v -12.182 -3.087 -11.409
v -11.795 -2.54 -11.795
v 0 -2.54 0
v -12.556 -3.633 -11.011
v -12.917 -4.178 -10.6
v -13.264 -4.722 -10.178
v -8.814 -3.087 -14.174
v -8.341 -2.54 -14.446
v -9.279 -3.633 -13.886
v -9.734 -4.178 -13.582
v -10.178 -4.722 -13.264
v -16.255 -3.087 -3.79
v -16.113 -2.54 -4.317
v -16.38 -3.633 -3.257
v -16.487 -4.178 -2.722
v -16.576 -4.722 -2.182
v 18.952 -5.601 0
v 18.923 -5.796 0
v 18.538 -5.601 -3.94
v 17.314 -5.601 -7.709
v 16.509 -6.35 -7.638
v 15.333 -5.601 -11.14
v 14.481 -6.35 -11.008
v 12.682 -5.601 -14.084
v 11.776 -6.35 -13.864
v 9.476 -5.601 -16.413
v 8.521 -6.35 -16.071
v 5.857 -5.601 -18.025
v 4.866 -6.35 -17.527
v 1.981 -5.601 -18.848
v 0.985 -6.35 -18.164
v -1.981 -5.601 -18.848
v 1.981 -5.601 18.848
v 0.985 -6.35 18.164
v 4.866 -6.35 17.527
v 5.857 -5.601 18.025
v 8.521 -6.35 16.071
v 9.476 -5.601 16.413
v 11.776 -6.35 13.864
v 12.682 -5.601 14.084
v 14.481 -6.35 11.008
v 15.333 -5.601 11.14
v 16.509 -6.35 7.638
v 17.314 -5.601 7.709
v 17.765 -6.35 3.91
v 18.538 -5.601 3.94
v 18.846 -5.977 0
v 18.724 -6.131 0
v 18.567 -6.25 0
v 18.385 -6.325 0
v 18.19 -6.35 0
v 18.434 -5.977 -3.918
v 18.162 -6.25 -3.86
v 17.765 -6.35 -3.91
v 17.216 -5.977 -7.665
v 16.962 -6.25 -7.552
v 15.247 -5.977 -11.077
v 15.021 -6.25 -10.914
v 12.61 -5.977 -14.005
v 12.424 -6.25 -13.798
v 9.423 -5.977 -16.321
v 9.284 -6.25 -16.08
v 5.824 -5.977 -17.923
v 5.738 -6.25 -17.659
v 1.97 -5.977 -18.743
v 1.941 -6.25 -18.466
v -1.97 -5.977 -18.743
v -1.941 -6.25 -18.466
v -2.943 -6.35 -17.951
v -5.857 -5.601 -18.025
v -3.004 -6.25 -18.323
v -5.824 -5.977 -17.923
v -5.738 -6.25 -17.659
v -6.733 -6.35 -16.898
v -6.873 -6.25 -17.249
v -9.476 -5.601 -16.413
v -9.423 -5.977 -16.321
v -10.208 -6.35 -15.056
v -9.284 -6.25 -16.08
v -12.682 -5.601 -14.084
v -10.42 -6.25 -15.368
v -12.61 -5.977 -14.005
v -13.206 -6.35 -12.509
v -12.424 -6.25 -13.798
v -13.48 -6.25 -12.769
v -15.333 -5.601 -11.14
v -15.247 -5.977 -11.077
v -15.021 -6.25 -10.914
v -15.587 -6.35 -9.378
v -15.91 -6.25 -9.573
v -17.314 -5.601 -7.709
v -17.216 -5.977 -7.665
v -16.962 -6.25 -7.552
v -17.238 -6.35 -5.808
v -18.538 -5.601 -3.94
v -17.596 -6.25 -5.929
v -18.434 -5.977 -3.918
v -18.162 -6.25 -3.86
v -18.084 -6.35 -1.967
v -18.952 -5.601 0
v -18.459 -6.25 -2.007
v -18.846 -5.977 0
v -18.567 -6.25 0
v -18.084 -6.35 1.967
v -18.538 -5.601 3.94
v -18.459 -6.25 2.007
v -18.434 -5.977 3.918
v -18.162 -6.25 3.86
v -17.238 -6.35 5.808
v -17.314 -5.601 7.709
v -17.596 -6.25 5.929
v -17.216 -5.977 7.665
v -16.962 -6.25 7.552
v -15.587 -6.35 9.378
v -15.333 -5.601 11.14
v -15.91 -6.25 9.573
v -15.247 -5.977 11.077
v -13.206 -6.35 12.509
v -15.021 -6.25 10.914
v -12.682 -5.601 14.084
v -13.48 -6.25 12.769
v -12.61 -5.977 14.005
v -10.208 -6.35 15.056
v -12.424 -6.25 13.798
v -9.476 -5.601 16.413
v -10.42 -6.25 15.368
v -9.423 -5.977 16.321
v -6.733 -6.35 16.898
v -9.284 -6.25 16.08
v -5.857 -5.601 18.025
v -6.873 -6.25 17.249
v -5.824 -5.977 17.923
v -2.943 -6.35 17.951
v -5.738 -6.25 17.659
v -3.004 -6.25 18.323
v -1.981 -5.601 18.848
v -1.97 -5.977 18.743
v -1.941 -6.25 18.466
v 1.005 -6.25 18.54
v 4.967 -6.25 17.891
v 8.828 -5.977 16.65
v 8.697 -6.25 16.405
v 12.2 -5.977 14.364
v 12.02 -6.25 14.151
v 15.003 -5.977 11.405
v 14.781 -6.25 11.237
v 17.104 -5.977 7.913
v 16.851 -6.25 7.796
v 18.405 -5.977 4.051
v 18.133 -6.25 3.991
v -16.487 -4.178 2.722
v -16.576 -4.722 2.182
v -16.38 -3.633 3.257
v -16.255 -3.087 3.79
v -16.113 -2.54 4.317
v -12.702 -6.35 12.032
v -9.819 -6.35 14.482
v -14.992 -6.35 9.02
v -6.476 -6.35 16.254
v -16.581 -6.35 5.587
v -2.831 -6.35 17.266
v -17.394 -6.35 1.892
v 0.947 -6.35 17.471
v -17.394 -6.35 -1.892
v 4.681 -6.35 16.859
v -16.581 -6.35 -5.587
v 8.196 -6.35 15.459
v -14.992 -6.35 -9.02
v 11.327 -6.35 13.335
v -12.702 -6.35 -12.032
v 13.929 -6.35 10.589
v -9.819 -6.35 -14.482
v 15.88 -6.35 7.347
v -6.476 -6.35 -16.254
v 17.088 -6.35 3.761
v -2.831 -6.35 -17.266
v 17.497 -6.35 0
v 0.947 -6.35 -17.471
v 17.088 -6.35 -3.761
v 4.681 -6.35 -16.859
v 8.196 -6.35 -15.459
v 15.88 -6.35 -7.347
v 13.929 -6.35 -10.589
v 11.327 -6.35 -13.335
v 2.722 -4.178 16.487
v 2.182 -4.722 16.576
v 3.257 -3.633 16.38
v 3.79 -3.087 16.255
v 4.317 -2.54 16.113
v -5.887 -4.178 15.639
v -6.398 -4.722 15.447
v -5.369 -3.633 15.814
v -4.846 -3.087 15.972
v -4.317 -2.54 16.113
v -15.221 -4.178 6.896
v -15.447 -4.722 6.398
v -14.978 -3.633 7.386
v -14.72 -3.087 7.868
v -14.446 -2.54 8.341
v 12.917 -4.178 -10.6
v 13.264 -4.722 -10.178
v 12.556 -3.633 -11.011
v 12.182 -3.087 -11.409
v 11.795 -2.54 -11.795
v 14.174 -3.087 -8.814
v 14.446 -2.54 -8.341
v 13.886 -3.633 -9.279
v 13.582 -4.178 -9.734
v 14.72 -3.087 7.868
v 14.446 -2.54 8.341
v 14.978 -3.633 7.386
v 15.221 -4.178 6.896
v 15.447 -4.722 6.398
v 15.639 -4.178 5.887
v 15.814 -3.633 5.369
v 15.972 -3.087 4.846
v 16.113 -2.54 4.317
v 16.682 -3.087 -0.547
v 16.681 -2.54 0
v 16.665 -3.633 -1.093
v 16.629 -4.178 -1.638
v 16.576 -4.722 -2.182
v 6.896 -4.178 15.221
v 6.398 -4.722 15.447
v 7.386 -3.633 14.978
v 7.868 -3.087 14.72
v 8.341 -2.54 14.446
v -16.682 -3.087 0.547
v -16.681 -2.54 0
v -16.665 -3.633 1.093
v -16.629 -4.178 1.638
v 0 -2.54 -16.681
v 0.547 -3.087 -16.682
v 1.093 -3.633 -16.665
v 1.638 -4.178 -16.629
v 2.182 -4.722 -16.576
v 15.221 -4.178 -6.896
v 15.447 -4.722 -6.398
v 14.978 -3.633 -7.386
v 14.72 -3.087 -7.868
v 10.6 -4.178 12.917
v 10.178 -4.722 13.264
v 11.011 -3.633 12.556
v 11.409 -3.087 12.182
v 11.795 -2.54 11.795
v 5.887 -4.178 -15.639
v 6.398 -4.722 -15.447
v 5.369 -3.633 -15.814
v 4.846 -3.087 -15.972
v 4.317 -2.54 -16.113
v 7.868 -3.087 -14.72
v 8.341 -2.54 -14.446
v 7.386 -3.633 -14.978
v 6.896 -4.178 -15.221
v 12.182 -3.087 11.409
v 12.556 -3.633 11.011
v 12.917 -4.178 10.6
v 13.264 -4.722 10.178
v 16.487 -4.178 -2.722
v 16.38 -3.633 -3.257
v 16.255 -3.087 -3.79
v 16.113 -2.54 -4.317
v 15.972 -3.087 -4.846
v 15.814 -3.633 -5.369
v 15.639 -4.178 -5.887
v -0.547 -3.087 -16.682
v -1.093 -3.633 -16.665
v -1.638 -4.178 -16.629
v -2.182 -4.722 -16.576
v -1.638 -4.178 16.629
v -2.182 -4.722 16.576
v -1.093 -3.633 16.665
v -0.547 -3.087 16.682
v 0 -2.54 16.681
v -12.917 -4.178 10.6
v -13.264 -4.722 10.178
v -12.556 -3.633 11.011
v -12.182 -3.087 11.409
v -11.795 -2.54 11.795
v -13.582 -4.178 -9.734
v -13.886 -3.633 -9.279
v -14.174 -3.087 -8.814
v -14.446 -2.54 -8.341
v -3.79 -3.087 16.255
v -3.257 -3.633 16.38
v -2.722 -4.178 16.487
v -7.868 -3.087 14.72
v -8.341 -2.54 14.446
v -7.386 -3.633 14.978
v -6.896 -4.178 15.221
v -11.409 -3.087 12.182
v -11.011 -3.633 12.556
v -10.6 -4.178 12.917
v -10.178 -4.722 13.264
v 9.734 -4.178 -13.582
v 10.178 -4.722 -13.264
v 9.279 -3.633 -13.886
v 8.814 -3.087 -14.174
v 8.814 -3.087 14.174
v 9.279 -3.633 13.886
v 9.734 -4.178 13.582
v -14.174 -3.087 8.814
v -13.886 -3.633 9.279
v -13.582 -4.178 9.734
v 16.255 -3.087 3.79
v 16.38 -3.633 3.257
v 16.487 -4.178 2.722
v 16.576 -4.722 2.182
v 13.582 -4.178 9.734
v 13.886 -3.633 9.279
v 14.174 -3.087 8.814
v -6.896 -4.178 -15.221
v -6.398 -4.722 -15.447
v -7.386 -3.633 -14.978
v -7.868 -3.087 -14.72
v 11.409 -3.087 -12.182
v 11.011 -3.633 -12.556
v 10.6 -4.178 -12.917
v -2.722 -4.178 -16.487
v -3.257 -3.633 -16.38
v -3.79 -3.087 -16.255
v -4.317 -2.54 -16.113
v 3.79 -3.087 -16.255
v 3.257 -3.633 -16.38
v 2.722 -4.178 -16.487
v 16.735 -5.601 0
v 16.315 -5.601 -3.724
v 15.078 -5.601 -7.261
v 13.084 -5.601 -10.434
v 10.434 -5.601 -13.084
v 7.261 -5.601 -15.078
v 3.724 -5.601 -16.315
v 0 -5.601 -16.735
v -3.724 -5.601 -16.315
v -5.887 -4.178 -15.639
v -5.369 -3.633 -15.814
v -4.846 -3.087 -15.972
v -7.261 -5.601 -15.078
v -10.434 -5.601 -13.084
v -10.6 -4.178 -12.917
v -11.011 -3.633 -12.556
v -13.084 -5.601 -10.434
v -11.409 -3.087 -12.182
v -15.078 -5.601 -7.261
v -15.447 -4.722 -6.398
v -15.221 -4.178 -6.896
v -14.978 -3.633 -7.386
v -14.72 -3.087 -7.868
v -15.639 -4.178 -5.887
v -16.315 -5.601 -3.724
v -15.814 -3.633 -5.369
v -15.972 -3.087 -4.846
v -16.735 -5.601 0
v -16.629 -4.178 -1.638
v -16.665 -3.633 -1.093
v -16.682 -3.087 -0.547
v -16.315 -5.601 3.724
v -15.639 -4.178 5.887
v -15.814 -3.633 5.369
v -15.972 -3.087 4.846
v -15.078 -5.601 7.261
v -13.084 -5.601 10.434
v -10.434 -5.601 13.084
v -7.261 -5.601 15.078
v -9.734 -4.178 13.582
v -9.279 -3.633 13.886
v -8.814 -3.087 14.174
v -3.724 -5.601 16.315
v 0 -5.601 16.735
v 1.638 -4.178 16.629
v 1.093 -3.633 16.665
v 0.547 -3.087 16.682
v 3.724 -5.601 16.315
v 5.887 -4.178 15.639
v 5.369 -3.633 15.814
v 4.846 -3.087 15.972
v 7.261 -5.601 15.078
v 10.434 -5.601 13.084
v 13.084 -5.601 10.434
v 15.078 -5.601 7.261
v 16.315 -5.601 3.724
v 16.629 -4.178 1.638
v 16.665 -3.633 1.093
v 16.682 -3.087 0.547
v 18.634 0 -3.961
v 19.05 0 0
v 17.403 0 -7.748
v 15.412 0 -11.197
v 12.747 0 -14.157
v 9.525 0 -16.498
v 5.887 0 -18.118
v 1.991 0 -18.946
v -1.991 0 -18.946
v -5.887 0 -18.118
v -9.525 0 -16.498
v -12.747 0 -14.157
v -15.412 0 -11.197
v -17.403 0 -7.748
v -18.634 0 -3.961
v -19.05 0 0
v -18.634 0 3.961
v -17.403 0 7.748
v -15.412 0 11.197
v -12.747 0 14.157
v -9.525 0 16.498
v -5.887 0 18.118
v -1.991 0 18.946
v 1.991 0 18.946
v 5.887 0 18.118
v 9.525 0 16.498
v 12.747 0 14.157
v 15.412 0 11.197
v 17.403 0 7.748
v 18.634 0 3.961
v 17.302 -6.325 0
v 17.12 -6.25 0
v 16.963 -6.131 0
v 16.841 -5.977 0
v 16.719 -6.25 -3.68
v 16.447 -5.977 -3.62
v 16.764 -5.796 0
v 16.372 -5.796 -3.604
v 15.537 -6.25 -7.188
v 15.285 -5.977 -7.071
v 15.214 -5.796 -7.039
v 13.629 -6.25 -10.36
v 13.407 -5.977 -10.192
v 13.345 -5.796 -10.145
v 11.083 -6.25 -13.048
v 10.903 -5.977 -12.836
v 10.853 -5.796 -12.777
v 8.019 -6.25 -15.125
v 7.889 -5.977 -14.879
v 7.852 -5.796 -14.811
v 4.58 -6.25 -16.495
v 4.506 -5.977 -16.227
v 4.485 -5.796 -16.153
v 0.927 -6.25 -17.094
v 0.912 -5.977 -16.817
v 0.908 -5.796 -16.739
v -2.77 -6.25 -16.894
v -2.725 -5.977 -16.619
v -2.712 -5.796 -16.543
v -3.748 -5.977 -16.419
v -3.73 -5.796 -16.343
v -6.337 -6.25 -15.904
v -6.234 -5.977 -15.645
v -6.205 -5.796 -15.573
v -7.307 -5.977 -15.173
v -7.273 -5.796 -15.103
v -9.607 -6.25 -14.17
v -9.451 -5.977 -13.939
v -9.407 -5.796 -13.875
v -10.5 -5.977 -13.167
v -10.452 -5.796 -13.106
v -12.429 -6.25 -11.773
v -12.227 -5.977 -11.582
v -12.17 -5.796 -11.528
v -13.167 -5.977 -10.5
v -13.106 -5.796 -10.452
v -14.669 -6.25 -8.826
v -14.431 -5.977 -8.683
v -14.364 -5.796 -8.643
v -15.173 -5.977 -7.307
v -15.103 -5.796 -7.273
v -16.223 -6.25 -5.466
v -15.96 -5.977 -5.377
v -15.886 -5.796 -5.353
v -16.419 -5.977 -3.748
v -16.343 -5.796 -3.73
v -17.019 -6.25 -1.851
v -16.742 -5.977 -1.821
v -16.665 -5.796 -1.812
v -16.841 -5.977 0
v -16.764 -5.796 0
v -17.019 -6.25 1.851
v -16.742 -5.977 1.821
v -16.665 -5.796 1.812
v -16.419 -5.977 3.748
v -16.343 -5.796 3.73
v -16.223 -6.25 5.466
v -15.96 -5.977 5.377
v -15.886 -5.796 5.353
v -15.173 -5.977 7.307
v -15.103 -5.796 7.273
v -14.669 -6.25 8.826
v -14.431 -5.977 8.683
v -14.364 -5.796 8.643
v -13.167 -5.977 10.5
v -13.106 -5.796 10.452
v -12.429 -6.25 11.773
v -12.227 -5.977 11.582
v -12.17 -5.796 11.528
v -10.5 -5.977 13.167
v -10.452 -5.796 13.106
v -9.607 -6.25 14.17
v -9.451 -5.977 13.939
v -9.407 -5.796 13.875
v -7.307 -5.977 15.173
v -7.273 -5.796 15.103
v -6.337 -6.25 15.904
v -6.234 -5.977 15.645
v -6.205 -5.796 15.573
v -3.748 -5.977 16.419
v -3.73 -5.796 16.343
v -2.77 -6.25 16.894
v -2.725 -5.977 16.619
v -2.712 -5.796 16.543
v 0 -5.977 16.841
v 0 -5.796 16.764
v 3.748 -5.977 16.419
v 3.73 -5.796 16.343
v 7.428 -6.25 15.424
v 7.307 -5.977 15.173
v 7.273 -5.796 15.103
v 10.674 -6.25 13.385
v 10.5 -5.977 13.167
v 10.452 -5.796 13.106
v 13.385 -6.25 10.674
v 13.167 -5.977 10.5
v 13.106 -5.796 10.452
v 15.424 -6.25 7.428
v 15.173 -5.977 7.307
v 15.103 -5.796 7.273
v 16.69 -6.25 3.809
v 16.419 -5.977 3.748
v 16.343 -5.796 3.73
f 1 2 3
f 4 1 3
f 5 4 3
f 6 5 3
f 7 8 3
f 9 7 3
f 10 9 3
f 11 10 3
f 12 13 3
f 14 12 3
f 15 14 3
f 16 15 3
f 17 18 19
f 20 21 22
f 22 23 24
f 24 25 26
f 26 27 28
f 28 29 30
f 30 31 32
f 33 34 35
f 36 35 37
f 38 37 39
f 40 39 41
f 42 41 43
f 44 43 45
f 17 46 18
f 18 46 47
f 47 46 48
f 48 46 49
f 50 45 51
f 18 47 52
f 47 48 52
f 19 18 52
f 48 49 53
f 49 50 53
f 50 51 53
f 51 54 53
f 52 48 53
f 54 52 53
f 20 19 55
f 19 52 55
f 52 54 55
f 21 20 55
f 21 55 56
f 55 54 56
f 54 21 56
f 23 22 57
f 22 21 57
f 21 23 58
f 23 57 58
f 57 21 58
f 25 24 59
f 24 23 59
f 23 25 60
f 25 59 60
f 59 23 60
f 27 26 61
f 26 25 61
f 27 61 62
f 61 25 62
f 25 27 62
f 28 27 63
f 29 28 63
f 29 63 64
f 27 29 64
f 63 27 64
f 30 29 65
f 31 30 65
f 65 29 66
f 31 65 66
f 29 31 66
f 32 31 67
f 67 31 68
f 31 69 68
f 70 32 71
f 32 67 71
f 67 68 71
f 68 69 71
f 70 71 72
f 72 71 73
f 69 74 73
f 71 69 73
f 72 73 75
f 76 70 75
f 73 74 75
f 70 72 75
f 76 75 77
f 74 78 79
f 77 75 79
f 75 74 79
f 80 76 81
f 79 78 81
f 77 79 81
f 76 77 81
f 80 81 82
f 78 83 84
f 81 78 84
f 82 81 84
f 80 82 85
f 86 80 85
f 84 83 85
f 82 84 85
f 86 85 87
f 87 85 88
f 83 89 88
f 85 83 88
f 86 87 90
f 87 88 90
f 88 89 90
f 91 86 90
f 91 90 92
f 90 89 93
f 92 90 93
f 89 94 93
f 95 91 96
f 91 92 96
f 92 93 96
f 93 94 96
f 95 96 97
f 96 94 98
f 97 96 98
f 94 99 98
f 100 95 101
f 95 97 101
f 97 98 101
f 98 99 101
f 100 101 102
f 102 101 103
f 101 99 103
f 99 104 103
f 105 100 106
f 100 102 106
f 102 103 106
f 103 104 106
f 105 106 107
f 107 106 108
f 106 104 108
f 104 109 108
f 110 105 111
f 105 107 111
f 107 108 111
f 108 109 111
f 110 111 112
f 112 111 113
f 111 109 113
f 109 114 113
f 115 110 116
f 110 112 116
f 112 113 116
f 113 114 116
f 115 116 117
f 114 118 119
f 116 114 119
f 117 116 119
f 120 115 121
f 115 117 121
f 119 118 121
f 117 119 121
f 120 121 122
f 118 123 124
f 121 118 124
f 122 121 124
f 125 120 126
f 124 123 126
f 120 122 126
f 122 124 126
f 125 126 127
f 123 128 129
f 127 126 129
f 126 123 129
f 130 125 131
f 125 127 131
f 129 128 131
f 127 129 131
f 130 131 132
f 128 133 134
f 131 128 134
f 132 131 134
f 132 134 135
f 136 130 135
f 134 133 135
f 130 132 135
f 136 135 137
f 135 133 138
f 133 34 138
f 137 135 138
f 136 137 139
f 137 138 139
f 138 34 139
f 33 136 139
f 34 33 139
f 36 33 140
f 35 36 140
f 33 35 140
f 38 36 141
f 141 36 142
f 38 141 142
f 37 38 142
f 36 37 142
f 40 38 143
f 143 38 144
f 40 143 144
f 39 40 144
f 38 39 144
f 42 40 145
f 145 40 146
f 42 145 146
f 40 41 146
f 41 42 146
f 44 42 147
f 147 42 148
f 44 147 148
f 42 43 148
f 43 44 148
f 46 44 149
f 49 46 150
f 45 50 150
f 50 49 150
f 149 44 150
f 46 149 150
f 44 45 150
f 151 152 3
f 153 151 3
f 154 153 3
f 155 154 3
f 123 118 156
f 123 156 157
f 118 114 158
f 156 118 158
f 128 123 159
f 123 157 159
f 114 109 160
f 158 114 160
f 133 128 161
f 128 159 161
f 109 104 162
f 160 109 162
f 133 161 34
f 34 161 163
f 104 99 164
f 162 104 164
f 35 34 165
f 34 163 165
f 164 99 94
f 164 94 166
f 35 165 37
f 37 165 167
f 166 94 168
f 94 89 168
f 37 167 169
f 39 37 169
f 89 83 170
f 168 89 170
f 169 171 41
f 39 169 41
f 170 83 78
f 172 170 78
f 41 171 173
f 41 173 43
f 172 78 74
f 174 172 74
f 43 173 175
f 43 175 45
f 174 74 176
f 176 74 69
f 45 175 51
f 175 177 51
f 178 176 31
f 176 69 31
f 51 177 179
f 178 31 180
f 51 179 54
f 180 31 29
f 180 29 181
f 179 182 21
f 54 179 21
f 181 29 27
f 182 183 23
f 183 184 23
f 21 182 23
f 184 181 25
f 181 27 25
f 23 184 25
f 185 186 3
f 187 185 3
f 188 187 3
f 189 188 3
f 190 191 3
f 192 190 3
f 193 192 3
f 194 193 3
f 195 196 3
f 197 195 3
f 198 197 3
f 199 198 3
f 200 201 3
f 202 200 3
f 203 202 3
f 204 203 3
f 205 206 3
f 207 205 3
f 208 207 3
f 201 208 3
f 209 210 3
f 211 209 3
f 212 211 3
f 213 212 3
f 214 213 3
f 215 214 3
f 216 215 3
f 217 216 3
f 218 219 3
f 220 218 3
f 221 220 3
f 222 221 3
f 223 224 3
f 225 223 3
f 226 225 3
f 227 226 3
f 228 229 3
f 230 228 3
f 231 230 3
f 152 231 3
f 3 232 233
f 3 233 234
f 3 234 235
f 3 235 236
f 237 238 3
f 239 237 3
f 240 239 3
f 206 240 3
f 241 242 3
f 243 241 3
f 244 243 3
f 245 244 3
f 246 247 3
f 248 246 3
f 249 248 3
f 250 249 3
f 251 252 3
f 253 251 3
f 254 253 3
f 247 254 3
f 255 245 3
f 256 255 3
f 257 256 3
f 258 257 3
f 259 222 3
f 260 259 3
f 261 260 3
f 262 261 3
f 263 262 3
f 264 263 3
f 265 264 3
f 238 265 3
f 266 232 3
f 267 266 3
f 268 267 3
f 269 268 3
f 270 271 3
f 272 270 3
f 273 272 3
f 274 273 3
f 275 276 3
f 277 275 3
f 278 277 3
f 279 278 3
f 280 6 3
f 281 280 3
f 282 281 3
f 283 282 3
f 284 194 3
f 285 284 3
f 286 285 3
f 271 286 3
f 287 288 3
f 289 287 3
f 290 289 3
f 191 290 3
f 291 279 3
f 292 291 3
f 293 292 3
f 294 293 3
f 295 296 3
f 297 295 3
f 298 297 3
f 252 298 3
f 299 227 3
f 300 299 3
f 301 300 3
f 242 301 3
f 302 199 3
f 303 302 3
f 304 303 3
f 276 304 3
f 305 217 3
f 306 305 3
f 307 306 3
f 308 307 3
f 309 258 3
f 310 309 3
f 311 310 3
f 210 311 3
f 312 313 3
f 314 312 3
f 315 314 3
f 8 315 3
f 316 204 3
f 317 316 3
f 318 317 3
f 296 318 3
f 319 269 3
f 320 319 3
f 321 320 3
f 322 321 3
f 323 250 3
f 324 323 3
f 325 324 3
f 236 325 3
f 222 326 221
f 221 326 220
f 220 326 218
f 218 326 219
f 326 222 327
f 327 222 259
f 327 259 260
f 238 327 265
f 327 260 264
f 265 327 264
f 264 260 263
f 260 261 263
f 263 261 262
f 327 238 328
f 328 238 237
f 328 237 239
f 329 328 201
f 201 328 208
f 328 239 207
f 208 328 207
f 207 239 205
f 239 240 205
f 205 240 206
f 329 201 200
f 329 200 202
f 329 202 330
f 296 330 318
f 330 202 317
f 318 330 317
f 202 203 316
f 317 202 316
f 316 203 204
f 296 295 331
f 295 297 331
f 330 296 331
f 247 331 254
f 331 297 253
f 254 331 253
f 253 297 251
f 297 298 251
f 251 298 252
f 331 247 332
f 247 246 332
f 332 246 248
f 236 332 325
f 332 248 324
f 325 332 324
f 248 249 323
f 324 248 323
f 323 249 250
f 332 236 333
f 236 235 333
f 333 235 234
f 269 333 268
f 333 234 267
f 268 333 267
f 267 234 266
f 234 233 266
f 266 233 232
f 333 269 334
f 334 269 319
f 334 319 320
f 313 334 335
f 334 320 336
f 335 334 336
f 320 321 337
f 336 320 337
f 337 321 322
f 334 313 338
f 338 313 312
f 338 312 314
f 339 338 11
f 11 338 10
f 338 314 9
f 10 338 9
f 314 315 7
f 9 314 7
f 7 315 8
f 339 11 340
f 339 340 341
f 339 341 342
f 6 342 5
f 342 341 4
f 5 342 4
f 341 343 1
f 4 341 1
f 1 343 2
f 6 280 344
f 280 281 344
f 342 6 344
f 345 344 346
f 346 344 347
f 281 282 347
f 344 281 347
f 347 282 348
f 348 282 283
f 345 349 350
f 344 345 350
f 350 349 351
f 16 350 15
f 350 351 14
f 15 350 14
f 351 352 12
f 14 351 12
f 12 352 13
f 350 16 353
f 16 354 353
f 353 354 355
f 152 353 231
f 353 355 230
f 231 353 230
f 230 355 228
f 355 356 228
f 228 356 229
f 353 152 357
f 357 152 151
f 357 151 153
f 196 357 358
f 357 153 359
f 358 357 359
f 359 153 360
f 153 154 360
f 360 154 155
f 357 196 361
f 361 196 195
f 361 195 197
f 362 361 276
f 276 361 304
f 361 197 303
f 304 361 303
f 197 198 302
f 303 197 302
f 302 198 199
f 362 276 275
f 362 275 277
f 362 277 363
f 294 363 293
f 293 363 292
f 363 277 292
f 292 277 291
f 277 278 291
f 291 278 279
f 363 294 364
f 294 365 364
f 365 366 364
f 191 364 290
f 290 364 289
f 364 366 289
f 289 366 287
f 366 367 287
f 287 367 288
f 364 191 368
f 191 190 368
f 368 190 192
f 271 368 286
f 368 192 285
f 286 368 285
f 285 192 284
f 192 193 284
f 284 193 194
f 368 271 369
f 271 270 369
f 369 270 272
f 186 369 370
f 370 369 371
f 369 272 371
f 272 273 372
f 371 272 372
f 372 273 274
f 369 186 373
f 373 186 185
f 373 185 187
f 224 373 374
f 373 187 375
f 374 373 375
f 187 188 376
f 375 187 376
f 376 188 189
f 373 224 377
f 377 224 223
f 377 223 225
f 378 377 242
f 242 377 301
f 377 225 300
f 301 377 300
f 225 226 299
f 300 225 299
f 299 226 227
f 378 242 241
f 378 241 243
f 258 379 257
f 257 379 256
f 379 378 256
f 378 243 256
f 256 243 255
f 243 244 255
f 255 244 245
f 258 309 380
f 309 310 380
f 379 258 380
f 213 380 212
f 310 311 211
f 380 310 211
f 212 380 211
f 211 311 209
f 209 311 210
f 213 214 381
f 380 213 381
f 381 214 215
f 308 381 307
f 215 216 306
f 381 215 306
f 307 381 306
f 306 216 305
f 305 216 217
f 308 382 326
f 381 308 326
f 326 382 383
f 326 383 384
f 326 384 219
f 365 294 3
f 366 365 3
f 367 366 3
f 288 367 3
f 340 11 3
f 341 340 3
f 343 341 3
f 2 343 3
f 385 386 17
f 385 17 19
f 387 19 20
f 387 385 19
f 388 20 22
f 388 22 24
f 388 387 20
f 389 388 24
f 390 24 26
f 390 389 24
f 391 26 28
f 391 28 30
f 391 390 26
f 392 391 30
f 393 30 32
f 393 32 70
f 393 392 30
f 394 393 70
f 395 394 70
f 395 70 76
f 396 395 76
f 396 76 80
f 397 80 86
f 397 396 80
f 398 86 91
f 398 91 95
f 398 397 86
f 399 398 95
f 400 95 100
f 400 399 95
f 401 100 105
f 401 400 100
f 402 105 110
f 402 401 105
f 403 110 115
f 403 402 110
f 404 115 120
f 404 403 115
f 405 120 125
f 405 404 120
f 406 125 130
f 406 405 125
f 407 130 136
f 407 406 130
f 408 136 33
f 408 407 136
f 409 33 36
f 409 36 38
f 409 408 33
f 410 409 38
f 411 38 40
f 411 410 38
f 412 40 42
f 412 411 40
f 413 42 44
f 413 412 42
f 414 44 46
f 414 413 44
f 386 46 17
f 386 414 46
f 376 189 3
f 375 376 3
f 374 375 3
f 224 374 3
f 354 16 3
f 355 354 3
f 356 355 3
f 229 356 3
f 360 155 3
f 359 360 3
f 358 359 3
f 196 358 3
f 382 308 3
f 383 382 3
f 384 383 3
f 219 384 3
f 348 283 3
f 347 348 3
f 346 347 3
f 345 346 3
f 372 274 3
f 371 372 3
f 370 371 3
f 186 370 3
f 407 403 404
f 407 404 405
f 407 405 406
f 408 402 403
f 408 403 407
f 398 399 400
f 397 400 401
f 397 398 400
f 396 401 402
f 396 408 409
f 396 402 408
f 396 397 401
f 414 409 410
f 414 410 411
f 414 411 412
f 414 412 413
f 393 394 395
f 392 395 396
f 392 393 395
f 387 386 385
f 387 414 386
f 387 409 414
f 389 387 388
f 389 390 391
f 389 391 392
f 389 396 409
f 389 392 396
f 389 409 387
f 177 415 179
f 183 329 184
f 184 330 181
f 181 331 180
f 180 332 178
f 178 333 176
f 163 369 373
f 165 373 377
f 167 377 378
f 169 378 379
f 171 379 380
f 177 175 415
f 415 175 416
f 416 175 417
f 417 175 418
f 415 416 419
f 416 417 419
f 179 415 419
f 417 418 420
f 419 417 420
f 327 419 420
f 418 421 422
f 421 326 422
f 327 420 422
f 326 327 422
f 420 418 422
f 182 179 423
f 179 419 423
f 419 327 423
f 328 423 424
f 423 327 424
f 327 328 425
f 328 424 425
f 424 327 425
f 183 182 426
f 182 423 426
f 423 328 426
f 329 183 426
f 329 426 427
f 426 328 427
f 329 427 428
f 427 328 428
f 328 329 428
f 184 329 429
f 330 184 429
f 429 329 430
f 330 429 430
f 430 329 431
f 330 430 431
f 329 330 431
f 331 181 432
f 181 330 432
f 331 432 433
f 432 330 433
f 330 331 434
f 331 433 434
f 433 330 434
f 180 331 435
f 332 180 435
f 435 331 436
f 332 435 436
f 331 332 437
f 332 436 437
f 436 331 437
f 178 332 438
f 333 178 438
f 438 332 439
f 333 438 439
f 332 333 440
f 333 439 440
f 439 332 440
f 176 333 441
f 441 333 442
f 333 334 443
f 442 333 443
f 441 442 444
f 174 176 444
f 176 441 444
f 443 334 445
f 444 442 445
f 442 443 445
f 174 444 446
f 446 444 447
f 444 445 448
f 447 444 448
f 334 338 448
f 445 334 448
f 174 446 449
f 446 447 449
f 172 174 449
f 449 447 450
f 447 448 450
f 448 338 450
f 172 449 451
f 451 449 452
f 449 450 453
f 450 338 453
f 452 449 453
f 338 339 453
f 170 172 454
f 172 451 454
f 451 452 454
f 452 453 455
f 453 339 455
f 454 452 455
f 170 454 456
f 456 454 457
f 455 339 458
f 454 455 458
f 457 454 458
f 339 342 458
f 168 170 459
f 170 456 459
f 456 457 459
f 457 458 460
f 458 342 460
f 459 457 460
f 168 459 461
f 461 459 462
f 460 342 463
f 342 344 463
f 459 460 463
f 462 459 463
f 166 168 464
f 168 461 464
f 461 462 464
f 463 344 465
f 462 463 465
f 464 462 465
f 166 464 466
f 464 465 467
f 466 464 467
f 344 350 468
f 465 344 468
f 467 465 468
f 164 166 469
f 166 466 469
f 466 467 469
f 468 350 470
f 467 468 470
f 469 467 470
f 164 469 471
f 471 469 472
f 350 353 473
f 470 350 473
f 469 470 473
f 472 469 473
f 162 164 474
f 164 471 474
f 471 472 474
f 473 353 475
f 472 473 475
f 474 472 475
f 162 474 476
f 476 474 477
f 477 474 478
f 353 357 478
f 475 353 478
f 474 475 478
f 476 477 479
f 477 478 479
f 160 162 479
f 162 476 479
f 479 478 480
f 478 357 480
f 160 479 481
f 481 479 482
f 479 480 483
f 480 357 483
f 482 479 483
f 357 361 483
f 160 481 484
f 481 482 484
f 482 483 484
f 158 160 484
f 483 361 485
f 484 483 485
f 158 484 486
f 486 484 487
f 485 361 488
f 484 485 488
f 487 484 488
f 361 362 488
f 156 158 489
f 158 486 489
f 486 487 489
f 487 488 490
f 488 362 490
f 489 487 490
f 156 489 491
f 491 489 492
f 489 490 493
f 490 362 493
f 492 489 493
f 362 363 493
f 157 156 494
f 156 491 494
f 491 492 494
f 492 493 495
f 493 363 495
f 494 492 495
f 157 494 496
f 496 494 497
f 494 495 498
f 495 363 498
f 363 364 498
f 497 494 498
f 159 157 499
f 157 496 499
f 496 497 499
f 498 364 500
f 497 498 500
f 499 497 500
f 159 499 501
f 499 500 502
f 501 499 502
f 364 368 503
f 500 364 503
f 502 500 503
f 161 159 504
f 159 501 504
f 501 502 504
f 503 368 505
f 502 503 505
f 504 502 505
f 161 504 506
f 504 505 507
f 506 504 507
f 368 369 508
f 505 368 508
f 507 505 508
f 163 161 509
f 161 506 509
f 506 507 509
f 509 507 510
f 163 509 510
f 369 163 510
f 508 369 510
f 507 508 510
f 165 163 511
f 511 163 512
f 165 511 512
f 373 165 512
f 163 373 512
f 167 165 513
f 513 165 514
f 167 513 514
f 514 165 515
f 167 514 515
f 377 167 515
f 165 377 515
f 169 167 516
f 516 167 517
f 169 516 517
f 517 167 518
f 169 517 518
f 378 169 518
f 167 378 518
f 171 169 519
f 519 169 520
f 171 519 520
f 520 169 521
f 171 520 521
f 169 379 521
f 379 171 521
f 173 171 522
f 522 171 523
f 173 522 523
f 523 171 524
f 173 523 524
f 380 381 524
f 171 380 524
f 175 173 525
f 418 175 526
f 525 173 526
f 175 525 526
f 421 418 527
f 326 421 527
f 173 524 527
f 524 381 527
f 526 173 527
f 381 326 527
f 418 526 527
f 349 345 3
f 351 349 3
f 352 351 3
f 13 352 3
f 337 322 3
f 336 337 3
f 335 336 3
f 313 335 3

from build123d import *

# Parameters (mm, degrees)
SKETCH1_R           = 19.05
BOSS_EXTRUDE1_DEPTH = 6.35
BOSS_EXTRUDE1_DRAFT = -1
CUT_EXTRUDE3_DEPTH  = 20.05
CIRPATTERN3_COUNT   = 24
SKETCH7_R           = 19.05
SKETCH7_R_2         = 16.637
BOSS_EXTRUDE3_DEPTH = 6.35
BOSS_EXTRUDE3_DRAFT = -1
FILLET2_R           = 0.762


with BuildPart() as part:
    # Sketch1 → Boss-Extrude1 (with draft: the straight prism first)
    with BuildSketch(Plane(origin=(0, 0, 0), x_dir=(1, 0, 0), z_dir=(0, 1, 0))):
        Circle(SKETCH1_R)
    extrude(amount=-BOSS_EXTRUDE1_DEPTH)
    # Boss-Extrude1: the draft: its side faces are tilted about the plane it starts from
    boss_extrude1_sides = [part.faces().sort_by_distance(p)[0] for p in [
        (-19.05, -3.175, 0),
    ]]
    draft(boss_extrude1_sides, Plane(origin=(0, 0, 0), x_dir=(1, 0, 0), z_dir=(0, 1, 0)), BOSS_EXTRUDE1_DRAFT)

    # Sketch6 → Cut-Extrude3 (cut, through all)
    with BuildSketch(Plane.XY):
        Polygon((0, -2.54), (-6.985, -9.525), (6.985, -9.525), align=None)
    cut_extrude3 = extrude(amount=-CUT_EXTRUDE3_DEPTH, mode=Mode.SUBTRACT)

    # CirPattern3: Cut-Extrude3 ×24 about axis
    cirpattern3_axis = Axis((0, 0, 0), (0, 1, 0))
    for i in range(1, CIRPATTERN3_COUNT):
        add(cut_extrude3.rotate(cirpattern3_axis, i * 360 / CIRPATTERN3_COUNT), mode=Mode.SUBTRACT)


with BuildPart() as boss_extrude3_tool:
    # Sketch7 → Boss-Extrude3 (with draft: the straight prism first)
    with BuildSketch(Plane(origin=(0, 0, 0), x_dir=(1, 0, 0), z_dir=(0, 1, 0))):
        Circle(SKETCH7_R)
        Circle(SKETCH7_R_2, mode=Mode.SUBTRACT)
    extrude(amount=-BOSS_EXTRUDE3_DEPTH)
    # Boss-Extrude3: the draft: its side faces are tilted about the plane it starts from
    boss_extrude3_sides = [boss_extrude3_tool.faces().sort_by_distance(p)[0] for p in [
        (-19.05, -3.175, 0),
        (-16.637, -3.175, 0),
    ]]
    draft(boss_extrude3_sides, Plane(origin=(0, 0, 0), x_dir=(1, 0, 0), z_dir=(0, 1, 0)), BOSS_EXTRUDE3_DRAFT)


with BuildPart() as part_1:
    add(part.part)

    # Boss-Extrude3: add boss_extrude3_tool
    add(boss_extrude3_tool.part)

    # Fillet2
    fillet2_edges = [part_1.edges().sort_by_distance(p)[0] for p in [
        (-18.939160338, -6.35, 0),
        (-16.747839662, -6.35, 0),
    ]]
    fillet(fillet2_edges, radius=FILLET2_R)


solid = part_1.part
